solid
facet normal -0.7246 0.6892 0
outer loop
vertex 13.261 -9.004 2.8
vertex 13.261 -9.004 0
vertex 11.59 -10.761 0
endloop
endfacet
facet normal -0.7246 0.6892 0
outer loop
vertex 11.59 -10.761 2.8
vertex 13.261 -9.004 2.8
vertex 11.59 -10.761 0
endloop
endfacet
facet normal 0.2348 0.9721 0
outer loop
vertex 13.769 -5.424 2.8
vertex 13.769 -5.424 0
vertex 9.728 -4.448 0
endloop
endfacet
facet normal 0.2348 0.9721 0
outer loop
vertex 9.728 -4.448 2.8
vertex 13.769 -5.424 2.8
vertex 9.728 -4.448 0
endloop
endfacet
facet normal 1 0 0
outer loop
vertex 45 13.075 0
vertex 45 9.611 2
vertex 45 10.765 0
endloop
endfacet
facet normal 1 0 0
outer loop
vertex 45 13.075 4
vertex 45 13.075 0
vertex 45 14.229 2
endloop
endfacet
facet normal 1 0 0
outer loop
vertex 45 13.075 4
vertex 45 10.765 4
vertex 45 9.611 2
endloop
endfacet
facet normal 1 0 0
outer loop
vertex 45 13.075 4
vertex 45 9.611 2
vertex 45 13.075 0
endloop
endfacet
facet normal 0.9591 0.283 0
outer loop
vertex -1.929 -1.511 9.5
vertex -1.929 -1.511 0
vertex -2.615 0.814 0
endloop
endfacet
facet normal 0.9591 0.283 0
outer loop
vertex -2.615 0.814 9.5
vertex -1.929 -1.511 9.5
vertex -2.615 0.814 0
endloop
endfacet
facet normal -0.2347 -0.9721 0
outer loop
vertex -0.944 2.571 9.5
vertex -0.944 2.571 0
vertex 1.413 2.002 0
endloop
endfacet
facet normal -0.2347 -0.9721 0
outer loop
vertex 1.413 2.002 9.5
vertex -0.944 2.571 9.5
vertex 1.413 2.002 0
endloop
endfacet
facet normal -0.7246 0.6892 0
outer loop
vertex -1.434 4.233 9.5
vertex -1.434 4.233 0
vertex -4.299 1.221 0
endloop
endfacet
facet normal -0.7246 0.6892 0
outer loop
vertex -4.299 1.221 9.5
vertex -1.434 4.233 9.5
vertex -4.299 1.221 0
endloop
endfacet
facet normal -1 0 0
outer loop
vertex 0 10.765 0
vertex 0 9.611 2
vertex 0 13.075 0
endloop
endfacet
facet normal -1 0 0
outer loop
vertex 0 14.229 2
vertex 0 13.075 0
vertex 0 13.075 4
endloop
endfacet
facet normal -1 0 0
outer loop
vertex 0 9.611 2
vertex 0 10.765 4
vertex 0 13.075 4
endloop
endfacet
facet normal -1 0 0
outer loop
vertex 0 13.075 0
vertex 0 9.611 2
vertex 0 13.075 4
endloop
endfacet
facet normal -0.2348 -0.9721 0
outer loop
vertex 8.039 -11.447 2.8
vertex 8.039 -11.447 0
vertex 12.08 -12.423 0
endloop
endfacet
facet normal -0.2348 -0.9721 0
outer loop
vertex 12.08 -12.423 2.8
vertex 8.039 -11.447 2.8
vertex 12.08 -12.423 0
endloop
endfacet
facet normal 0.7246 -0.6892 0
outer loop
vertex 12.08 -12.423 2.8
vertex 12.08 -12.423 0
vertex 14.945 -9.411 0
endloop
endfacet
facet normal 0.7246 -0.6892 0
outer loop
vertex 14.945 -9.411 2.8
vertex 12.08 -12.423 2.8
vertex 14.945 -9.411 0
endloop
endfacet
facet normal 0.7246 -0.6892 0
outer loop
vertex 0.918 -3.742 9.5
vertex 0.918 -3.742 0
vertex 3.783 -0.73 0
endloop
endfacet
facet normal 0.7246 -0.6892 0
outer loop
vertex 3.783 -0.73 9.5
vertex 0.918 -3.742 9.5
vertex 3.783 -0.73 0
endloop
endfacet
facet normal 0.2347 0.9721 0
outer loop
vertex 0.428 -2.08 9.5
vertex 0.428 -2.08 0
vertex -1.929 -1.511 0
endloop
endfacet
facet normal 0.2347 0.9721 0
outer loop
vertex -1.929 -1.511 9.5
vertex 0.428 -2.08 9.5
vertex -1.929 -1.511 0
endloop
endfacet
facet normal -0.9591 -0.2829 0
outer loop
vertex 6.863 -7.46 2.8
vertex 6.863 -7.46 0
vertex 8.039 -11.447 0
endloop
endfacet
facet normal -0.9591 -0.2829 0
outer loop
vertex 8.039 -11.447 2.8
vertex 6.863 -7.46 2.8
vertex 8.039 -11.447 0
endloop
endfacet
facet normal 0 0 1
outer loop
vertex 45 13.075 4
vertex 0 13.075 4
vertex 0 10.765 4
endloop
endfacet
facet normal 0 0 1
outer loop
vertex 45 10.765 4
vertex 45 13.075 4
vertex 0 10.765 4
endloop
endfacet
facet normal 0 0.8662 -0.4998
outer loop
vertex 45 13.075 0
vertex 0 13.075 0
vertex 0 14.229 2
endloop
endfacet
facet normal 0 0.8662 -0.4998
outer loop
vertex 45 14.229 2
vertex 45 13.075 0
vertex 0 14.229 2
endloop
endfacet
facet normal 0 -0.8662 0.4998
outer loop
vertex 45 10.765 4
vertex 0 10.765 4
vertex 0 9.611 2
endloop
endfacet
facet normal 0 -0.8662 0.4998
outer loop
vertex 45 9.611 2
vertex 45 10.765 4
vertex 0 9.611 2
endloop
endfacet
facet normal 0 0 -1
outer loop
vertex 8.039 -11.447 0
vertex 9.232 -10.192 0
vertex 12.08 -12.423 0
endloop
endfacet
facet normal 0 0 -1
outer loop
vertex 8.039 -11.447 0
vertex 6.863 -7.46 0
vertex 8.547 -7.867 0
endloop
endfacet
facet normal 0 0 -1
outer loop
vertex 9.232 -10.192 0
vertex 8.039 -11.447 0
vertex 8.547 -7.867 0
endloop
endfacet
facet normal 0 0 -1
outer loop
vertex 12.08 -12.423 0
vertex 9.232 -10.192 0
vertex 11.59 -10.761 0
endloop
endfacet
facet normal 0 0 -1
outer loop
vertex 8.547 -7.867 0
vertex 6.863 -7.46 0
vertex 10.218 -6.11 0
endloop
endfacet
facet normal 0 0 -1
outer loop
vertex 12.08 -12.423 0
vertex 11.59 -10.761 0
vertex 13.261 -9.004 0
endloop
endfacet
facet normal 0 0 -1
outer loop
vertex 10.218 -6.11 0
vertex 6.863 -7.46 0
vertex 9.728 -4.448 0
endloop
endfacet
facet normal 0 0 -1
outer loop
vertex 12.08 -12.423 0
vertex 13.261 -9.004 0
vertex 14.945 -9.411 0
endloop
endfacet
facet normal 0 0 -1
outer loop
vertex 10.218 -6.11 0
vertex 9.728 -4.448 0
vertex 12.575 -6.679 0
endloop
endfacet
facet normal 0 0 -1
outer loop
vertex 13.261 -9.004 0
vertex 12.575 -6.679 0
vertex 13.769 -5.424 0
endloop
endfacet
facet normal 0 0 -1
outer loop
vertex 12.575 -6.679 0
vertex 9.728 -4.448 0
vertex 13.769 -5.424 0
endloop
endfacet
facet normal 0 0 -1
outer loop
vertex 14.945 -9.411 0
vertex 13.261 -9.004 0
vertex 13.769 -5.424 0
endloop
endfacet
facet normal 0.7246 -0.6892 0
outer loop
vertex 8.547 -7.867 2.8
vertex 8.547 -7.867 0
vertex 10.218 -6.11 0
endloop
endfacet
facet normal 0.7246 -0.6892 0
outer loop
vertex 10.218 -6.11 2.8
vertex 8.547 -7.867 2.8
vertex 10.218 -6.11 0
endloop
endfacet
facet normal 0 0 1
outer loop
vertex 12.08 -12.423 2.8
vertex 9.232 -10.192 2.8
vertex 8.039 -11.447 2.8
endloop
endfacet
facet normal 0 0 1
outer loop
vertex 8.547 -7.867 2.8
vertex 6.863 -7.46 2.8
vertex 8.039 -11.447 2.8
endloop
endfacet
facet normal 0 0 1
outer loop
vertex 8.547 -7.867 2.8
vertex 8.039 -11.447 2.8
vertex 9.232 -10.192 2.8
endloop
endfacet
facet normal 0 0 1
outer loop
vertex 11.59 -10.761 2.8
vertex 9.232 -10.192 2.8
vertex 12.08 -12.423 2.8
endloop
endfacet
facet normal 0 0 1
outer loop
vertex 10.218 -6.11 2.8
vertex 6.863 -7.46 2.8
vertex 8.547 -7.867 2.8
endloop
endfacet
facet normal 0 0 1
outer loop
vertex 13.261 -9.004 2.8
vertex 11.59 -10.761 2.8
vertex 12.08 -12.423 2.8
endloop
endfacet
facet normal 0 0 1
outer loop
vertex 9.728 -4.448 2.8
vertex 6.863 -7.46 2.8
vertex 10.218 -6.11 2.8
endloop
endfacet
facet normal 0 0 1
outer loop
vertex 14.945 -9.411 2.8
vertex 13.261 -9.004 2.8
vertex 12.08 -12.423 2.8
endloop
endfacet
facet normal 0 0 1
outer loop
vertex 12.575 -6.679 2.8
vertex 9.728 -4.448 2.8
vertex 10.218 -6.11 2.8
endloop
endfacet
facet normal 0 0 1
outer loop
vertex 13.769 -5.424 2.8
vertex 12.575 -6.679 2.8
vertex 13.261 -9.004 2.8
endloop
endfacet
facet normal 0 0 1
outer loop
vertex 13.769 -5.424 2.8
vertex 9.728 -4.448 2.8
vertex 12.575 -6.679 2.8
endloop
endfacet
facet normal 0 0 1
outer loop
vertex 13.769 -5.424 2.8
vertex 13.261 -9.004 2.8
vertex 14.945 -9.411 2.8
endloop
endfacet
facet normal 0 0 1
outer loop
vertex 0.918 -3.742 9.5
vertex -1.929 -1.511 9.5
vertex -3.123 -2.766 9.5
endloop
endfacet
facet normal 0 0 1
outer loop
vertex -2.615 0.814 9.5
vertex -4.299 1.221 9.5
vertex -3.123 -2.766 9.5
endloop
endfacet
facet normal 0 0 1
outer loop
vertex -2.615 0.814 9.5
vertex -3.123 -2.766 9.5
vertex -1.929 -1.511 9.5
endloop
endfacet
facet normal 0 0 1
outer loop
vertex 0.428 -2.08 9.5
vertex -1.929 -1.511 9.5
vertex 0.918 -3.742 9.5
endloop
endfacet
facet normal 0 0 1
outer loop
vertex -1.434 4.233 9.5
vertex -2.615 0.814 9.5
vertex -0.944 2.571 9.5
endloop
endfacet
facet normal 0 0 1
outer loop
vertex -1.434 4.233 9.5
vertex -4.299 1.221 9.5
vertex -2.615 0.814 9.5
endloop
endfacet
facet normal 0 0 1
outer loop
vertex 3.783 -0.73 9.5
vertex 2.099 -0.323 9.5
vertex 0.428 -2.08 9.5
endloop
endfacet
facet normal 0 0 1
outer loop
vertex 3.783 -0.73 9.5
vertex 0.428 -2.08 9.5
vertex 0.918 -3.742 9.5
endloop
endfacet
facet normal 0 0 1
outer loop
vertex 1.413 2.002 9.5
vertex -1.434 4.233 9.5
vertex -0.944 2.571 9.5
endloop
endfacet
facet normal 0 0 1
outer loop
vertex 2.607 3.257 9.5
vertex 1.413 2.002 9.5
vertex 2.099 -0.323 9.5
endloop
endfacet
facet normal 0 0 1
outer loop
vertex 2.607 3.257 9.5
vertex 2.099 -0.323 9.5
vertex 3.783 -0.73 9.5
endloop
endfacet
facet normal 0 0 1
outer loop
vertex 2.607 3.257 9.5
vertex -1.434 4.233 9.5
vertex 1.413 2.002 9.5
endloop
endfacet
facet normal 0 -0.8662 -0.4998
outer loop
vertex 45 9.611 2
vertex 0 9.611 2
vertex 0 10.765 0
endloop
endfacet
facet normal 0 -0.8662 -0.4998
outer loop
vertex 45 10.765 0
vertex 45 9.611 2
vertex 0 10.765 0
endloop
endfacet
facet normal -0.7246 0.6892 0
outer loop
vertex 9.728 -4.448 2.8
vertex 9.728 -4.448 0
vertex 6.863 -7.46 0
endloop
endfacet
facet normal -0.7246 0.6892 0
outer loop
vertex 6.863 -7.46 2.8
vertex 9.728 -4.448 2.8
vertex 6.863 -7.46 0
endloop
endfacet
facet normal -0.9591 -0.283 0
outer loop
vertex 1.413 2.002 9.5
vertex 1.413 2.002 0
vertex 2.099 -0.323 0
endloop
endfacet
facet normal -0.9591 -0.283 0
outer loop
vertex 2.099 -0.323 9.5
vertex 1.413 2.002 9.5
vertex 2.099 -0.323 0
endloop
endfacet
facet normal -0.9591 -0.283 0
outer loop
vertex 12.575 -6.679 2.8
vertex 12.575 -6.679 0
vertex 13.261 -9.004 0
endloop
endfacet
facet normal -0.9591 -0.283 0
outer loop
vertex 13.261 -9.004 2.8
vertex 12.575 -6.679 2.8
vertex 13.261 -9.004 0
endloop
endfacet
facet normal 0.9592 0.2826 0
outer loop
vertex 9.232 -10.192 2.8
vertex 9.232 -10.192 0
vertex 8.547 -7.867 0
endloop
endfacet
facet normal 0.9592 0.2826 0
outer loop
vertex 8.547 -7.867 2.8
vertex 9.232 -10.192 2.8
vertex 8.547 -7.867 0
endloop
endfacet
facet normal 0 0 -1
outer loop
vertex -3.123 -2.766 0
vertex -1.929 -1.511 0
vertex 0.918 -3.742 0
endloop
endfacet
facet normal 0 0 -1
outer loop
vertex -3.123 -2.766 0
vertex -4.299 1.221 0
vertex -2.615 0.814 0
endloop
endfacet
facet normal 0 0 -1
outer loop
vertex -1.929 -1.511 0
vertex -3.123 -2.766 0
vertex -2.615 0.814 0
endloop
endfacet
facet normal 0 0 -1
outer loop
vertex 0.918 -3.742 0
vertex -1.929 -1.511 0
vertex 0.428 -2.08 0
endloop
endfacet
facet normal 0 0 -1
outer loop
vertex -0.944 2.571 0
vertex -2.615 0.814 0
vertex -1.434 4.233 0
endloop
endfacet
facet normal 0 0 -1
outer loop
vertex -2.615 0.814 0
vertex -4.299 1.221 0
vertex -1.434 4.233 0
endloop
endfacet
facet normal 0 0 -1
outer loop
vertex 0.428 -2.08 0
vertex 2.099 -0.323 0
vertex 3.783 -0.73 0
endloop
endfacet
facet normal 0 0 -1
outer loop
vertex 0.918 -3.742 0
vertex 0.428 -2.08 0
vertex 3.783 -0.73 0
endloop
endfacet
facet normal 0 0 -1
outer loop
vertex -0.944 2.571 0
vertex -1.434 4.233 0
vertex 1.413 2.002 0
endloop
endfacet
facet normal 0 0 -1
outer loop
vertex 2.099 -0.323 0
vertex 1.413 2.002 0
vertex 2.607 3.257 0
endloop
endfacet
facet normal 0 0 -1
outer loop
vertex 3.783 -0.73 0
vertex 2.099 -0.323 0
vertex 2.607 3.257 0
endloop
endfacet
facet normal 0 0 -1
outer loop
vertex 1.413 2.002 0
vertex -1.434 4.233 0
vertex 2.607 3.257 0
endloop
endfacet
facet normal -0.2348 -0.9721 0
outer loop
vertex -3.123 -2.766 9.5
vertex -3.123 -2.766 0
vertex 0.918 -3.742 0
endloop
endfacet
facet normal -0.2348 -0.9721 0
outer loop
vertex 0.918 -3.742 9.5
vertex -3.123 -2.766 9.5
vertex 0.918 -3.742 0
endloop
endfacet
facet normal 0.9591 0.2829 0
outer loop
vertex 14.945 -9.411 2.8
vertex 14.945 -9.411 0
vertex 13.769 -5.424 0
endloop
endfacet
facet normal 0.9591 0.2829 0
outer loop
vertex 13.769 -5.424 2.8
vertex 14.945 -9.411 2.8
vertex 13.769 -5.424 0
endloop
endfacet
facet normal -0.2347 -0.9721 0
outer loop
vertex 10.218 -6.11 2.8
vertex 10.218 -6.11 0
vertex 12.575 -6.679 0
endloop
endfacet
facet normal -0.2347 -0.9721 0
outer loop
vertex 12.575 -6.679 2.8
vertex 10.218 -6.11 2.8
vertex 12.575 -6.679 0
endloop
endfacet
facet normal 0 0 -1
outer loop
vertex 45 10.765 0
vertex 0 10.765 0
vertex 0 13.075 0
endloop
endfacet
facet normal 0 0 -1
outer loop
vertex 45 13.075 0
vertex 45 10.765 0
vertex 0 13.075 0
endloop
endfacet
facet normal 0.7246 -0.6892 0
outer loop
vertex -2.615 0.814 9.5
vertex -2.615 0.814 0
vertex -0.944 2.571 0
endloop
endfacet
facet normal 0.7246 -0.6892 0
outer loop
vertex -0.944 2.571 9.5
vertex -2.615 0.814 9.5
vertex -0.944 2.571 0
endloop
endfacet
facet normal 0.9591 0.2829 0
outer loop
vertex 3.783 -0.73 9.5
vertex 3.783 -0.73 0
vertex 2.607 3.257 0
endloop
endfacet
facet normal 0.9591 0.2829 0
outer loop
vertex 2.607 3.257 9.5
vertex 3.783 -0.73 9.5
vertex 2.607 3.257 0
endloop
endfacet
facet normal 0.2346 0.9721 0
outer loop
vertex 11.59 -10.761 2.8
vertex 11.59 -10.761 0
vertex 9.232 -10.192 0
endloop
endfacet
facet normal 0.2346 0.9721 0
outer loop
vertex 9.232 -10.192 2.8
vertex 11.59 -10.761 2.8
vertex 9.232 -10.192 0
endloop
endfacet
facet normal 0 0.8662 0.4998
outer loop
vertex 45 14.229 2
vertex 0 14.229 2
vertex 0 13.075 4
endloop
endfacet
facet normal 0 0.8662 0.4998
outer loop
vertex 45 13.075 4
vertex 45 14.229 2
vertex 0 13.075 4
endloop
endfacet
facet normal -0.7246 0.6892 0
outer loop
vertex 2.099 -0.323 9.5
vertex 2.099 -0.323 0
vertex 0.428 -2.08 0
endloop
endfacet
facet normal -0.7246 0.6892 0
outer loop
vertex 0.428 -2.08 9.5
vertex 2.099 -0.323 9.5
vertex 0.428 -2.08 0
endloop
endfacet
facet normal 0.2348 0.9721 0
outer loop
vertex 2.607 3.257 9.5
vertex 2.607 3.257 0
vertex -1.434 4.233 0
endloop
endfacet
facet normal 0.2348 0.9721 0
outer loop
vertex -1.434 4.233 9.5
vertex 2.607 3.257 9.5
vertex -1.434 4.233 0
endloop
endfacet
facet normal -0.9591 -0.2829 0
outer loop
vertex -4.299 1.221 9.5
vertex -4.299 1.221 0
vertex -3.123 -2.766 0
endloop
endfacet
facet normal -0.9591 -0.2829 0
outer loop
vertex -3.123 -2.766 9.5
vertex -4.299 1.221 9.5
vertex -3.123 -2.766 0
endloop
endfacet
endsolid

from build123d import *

# Parameters (mm, degrees)
F1_DEPTH = 45
F3_DEPTH = 2.8
F5_DEPTH = 9.5


with BuildPart() as f1:
    # F0 (on Right) → F1 (new body)
    with BuildSketch(Plane.YZ):
        Polygon((13.074732, 0), (14.229433, 2), (13.074732, 4), (10.765331, 4), (9.610631, 2), (10.765331, 0), align=None)
    extrude(amount=F1_DEPTH)


with BuildPart() as f3:
    # F2 (on Top) → F3 (new body)
    with BuildSketch(Plane.XY):
        Polygon((12.079606, -12.422669), (14.944613, -9.410738), (13.768708, -5.423603), (9.727794, -4.448399), (6.862787, -7.460331), (8.038693, -11.447466), align=None)
        Polygon((12.574955, -6.678574), (13.2609, -9.004403), (11.589645, -10.761363), (9.232446, -10.192495), (8.546501, -7.866666), (10.217755, -6.109706), align=None, mode=Mode.SUBTRACT)
    extrude(amount=F3_DEPTH)


with BuildPart() as f5:
    # F4 (on Top) → F5 (new body)
    with BuildSketch(Plane.XY):
        Polygon((0.917782, -3.741603), (3.782789, -0.729671), (2.606883, 3.257464), (-1.43403, 4.232667), (-4.299037, 1.220736), (-3.123131, -2.766399), align=None)
        Polygon((1.41313, 2.002493), (2.099075, -0.323336), (0.427821, -2.080296), (-1.929378, -1.511428), (-2.615323, 0.814401), (-0.944069, 2.571361), align=None, mode=Mode.SUBTRACT)
    extrude(amount=F5_DEPTH)


solid = Compound([f1.part, f3.part, f5.part])
